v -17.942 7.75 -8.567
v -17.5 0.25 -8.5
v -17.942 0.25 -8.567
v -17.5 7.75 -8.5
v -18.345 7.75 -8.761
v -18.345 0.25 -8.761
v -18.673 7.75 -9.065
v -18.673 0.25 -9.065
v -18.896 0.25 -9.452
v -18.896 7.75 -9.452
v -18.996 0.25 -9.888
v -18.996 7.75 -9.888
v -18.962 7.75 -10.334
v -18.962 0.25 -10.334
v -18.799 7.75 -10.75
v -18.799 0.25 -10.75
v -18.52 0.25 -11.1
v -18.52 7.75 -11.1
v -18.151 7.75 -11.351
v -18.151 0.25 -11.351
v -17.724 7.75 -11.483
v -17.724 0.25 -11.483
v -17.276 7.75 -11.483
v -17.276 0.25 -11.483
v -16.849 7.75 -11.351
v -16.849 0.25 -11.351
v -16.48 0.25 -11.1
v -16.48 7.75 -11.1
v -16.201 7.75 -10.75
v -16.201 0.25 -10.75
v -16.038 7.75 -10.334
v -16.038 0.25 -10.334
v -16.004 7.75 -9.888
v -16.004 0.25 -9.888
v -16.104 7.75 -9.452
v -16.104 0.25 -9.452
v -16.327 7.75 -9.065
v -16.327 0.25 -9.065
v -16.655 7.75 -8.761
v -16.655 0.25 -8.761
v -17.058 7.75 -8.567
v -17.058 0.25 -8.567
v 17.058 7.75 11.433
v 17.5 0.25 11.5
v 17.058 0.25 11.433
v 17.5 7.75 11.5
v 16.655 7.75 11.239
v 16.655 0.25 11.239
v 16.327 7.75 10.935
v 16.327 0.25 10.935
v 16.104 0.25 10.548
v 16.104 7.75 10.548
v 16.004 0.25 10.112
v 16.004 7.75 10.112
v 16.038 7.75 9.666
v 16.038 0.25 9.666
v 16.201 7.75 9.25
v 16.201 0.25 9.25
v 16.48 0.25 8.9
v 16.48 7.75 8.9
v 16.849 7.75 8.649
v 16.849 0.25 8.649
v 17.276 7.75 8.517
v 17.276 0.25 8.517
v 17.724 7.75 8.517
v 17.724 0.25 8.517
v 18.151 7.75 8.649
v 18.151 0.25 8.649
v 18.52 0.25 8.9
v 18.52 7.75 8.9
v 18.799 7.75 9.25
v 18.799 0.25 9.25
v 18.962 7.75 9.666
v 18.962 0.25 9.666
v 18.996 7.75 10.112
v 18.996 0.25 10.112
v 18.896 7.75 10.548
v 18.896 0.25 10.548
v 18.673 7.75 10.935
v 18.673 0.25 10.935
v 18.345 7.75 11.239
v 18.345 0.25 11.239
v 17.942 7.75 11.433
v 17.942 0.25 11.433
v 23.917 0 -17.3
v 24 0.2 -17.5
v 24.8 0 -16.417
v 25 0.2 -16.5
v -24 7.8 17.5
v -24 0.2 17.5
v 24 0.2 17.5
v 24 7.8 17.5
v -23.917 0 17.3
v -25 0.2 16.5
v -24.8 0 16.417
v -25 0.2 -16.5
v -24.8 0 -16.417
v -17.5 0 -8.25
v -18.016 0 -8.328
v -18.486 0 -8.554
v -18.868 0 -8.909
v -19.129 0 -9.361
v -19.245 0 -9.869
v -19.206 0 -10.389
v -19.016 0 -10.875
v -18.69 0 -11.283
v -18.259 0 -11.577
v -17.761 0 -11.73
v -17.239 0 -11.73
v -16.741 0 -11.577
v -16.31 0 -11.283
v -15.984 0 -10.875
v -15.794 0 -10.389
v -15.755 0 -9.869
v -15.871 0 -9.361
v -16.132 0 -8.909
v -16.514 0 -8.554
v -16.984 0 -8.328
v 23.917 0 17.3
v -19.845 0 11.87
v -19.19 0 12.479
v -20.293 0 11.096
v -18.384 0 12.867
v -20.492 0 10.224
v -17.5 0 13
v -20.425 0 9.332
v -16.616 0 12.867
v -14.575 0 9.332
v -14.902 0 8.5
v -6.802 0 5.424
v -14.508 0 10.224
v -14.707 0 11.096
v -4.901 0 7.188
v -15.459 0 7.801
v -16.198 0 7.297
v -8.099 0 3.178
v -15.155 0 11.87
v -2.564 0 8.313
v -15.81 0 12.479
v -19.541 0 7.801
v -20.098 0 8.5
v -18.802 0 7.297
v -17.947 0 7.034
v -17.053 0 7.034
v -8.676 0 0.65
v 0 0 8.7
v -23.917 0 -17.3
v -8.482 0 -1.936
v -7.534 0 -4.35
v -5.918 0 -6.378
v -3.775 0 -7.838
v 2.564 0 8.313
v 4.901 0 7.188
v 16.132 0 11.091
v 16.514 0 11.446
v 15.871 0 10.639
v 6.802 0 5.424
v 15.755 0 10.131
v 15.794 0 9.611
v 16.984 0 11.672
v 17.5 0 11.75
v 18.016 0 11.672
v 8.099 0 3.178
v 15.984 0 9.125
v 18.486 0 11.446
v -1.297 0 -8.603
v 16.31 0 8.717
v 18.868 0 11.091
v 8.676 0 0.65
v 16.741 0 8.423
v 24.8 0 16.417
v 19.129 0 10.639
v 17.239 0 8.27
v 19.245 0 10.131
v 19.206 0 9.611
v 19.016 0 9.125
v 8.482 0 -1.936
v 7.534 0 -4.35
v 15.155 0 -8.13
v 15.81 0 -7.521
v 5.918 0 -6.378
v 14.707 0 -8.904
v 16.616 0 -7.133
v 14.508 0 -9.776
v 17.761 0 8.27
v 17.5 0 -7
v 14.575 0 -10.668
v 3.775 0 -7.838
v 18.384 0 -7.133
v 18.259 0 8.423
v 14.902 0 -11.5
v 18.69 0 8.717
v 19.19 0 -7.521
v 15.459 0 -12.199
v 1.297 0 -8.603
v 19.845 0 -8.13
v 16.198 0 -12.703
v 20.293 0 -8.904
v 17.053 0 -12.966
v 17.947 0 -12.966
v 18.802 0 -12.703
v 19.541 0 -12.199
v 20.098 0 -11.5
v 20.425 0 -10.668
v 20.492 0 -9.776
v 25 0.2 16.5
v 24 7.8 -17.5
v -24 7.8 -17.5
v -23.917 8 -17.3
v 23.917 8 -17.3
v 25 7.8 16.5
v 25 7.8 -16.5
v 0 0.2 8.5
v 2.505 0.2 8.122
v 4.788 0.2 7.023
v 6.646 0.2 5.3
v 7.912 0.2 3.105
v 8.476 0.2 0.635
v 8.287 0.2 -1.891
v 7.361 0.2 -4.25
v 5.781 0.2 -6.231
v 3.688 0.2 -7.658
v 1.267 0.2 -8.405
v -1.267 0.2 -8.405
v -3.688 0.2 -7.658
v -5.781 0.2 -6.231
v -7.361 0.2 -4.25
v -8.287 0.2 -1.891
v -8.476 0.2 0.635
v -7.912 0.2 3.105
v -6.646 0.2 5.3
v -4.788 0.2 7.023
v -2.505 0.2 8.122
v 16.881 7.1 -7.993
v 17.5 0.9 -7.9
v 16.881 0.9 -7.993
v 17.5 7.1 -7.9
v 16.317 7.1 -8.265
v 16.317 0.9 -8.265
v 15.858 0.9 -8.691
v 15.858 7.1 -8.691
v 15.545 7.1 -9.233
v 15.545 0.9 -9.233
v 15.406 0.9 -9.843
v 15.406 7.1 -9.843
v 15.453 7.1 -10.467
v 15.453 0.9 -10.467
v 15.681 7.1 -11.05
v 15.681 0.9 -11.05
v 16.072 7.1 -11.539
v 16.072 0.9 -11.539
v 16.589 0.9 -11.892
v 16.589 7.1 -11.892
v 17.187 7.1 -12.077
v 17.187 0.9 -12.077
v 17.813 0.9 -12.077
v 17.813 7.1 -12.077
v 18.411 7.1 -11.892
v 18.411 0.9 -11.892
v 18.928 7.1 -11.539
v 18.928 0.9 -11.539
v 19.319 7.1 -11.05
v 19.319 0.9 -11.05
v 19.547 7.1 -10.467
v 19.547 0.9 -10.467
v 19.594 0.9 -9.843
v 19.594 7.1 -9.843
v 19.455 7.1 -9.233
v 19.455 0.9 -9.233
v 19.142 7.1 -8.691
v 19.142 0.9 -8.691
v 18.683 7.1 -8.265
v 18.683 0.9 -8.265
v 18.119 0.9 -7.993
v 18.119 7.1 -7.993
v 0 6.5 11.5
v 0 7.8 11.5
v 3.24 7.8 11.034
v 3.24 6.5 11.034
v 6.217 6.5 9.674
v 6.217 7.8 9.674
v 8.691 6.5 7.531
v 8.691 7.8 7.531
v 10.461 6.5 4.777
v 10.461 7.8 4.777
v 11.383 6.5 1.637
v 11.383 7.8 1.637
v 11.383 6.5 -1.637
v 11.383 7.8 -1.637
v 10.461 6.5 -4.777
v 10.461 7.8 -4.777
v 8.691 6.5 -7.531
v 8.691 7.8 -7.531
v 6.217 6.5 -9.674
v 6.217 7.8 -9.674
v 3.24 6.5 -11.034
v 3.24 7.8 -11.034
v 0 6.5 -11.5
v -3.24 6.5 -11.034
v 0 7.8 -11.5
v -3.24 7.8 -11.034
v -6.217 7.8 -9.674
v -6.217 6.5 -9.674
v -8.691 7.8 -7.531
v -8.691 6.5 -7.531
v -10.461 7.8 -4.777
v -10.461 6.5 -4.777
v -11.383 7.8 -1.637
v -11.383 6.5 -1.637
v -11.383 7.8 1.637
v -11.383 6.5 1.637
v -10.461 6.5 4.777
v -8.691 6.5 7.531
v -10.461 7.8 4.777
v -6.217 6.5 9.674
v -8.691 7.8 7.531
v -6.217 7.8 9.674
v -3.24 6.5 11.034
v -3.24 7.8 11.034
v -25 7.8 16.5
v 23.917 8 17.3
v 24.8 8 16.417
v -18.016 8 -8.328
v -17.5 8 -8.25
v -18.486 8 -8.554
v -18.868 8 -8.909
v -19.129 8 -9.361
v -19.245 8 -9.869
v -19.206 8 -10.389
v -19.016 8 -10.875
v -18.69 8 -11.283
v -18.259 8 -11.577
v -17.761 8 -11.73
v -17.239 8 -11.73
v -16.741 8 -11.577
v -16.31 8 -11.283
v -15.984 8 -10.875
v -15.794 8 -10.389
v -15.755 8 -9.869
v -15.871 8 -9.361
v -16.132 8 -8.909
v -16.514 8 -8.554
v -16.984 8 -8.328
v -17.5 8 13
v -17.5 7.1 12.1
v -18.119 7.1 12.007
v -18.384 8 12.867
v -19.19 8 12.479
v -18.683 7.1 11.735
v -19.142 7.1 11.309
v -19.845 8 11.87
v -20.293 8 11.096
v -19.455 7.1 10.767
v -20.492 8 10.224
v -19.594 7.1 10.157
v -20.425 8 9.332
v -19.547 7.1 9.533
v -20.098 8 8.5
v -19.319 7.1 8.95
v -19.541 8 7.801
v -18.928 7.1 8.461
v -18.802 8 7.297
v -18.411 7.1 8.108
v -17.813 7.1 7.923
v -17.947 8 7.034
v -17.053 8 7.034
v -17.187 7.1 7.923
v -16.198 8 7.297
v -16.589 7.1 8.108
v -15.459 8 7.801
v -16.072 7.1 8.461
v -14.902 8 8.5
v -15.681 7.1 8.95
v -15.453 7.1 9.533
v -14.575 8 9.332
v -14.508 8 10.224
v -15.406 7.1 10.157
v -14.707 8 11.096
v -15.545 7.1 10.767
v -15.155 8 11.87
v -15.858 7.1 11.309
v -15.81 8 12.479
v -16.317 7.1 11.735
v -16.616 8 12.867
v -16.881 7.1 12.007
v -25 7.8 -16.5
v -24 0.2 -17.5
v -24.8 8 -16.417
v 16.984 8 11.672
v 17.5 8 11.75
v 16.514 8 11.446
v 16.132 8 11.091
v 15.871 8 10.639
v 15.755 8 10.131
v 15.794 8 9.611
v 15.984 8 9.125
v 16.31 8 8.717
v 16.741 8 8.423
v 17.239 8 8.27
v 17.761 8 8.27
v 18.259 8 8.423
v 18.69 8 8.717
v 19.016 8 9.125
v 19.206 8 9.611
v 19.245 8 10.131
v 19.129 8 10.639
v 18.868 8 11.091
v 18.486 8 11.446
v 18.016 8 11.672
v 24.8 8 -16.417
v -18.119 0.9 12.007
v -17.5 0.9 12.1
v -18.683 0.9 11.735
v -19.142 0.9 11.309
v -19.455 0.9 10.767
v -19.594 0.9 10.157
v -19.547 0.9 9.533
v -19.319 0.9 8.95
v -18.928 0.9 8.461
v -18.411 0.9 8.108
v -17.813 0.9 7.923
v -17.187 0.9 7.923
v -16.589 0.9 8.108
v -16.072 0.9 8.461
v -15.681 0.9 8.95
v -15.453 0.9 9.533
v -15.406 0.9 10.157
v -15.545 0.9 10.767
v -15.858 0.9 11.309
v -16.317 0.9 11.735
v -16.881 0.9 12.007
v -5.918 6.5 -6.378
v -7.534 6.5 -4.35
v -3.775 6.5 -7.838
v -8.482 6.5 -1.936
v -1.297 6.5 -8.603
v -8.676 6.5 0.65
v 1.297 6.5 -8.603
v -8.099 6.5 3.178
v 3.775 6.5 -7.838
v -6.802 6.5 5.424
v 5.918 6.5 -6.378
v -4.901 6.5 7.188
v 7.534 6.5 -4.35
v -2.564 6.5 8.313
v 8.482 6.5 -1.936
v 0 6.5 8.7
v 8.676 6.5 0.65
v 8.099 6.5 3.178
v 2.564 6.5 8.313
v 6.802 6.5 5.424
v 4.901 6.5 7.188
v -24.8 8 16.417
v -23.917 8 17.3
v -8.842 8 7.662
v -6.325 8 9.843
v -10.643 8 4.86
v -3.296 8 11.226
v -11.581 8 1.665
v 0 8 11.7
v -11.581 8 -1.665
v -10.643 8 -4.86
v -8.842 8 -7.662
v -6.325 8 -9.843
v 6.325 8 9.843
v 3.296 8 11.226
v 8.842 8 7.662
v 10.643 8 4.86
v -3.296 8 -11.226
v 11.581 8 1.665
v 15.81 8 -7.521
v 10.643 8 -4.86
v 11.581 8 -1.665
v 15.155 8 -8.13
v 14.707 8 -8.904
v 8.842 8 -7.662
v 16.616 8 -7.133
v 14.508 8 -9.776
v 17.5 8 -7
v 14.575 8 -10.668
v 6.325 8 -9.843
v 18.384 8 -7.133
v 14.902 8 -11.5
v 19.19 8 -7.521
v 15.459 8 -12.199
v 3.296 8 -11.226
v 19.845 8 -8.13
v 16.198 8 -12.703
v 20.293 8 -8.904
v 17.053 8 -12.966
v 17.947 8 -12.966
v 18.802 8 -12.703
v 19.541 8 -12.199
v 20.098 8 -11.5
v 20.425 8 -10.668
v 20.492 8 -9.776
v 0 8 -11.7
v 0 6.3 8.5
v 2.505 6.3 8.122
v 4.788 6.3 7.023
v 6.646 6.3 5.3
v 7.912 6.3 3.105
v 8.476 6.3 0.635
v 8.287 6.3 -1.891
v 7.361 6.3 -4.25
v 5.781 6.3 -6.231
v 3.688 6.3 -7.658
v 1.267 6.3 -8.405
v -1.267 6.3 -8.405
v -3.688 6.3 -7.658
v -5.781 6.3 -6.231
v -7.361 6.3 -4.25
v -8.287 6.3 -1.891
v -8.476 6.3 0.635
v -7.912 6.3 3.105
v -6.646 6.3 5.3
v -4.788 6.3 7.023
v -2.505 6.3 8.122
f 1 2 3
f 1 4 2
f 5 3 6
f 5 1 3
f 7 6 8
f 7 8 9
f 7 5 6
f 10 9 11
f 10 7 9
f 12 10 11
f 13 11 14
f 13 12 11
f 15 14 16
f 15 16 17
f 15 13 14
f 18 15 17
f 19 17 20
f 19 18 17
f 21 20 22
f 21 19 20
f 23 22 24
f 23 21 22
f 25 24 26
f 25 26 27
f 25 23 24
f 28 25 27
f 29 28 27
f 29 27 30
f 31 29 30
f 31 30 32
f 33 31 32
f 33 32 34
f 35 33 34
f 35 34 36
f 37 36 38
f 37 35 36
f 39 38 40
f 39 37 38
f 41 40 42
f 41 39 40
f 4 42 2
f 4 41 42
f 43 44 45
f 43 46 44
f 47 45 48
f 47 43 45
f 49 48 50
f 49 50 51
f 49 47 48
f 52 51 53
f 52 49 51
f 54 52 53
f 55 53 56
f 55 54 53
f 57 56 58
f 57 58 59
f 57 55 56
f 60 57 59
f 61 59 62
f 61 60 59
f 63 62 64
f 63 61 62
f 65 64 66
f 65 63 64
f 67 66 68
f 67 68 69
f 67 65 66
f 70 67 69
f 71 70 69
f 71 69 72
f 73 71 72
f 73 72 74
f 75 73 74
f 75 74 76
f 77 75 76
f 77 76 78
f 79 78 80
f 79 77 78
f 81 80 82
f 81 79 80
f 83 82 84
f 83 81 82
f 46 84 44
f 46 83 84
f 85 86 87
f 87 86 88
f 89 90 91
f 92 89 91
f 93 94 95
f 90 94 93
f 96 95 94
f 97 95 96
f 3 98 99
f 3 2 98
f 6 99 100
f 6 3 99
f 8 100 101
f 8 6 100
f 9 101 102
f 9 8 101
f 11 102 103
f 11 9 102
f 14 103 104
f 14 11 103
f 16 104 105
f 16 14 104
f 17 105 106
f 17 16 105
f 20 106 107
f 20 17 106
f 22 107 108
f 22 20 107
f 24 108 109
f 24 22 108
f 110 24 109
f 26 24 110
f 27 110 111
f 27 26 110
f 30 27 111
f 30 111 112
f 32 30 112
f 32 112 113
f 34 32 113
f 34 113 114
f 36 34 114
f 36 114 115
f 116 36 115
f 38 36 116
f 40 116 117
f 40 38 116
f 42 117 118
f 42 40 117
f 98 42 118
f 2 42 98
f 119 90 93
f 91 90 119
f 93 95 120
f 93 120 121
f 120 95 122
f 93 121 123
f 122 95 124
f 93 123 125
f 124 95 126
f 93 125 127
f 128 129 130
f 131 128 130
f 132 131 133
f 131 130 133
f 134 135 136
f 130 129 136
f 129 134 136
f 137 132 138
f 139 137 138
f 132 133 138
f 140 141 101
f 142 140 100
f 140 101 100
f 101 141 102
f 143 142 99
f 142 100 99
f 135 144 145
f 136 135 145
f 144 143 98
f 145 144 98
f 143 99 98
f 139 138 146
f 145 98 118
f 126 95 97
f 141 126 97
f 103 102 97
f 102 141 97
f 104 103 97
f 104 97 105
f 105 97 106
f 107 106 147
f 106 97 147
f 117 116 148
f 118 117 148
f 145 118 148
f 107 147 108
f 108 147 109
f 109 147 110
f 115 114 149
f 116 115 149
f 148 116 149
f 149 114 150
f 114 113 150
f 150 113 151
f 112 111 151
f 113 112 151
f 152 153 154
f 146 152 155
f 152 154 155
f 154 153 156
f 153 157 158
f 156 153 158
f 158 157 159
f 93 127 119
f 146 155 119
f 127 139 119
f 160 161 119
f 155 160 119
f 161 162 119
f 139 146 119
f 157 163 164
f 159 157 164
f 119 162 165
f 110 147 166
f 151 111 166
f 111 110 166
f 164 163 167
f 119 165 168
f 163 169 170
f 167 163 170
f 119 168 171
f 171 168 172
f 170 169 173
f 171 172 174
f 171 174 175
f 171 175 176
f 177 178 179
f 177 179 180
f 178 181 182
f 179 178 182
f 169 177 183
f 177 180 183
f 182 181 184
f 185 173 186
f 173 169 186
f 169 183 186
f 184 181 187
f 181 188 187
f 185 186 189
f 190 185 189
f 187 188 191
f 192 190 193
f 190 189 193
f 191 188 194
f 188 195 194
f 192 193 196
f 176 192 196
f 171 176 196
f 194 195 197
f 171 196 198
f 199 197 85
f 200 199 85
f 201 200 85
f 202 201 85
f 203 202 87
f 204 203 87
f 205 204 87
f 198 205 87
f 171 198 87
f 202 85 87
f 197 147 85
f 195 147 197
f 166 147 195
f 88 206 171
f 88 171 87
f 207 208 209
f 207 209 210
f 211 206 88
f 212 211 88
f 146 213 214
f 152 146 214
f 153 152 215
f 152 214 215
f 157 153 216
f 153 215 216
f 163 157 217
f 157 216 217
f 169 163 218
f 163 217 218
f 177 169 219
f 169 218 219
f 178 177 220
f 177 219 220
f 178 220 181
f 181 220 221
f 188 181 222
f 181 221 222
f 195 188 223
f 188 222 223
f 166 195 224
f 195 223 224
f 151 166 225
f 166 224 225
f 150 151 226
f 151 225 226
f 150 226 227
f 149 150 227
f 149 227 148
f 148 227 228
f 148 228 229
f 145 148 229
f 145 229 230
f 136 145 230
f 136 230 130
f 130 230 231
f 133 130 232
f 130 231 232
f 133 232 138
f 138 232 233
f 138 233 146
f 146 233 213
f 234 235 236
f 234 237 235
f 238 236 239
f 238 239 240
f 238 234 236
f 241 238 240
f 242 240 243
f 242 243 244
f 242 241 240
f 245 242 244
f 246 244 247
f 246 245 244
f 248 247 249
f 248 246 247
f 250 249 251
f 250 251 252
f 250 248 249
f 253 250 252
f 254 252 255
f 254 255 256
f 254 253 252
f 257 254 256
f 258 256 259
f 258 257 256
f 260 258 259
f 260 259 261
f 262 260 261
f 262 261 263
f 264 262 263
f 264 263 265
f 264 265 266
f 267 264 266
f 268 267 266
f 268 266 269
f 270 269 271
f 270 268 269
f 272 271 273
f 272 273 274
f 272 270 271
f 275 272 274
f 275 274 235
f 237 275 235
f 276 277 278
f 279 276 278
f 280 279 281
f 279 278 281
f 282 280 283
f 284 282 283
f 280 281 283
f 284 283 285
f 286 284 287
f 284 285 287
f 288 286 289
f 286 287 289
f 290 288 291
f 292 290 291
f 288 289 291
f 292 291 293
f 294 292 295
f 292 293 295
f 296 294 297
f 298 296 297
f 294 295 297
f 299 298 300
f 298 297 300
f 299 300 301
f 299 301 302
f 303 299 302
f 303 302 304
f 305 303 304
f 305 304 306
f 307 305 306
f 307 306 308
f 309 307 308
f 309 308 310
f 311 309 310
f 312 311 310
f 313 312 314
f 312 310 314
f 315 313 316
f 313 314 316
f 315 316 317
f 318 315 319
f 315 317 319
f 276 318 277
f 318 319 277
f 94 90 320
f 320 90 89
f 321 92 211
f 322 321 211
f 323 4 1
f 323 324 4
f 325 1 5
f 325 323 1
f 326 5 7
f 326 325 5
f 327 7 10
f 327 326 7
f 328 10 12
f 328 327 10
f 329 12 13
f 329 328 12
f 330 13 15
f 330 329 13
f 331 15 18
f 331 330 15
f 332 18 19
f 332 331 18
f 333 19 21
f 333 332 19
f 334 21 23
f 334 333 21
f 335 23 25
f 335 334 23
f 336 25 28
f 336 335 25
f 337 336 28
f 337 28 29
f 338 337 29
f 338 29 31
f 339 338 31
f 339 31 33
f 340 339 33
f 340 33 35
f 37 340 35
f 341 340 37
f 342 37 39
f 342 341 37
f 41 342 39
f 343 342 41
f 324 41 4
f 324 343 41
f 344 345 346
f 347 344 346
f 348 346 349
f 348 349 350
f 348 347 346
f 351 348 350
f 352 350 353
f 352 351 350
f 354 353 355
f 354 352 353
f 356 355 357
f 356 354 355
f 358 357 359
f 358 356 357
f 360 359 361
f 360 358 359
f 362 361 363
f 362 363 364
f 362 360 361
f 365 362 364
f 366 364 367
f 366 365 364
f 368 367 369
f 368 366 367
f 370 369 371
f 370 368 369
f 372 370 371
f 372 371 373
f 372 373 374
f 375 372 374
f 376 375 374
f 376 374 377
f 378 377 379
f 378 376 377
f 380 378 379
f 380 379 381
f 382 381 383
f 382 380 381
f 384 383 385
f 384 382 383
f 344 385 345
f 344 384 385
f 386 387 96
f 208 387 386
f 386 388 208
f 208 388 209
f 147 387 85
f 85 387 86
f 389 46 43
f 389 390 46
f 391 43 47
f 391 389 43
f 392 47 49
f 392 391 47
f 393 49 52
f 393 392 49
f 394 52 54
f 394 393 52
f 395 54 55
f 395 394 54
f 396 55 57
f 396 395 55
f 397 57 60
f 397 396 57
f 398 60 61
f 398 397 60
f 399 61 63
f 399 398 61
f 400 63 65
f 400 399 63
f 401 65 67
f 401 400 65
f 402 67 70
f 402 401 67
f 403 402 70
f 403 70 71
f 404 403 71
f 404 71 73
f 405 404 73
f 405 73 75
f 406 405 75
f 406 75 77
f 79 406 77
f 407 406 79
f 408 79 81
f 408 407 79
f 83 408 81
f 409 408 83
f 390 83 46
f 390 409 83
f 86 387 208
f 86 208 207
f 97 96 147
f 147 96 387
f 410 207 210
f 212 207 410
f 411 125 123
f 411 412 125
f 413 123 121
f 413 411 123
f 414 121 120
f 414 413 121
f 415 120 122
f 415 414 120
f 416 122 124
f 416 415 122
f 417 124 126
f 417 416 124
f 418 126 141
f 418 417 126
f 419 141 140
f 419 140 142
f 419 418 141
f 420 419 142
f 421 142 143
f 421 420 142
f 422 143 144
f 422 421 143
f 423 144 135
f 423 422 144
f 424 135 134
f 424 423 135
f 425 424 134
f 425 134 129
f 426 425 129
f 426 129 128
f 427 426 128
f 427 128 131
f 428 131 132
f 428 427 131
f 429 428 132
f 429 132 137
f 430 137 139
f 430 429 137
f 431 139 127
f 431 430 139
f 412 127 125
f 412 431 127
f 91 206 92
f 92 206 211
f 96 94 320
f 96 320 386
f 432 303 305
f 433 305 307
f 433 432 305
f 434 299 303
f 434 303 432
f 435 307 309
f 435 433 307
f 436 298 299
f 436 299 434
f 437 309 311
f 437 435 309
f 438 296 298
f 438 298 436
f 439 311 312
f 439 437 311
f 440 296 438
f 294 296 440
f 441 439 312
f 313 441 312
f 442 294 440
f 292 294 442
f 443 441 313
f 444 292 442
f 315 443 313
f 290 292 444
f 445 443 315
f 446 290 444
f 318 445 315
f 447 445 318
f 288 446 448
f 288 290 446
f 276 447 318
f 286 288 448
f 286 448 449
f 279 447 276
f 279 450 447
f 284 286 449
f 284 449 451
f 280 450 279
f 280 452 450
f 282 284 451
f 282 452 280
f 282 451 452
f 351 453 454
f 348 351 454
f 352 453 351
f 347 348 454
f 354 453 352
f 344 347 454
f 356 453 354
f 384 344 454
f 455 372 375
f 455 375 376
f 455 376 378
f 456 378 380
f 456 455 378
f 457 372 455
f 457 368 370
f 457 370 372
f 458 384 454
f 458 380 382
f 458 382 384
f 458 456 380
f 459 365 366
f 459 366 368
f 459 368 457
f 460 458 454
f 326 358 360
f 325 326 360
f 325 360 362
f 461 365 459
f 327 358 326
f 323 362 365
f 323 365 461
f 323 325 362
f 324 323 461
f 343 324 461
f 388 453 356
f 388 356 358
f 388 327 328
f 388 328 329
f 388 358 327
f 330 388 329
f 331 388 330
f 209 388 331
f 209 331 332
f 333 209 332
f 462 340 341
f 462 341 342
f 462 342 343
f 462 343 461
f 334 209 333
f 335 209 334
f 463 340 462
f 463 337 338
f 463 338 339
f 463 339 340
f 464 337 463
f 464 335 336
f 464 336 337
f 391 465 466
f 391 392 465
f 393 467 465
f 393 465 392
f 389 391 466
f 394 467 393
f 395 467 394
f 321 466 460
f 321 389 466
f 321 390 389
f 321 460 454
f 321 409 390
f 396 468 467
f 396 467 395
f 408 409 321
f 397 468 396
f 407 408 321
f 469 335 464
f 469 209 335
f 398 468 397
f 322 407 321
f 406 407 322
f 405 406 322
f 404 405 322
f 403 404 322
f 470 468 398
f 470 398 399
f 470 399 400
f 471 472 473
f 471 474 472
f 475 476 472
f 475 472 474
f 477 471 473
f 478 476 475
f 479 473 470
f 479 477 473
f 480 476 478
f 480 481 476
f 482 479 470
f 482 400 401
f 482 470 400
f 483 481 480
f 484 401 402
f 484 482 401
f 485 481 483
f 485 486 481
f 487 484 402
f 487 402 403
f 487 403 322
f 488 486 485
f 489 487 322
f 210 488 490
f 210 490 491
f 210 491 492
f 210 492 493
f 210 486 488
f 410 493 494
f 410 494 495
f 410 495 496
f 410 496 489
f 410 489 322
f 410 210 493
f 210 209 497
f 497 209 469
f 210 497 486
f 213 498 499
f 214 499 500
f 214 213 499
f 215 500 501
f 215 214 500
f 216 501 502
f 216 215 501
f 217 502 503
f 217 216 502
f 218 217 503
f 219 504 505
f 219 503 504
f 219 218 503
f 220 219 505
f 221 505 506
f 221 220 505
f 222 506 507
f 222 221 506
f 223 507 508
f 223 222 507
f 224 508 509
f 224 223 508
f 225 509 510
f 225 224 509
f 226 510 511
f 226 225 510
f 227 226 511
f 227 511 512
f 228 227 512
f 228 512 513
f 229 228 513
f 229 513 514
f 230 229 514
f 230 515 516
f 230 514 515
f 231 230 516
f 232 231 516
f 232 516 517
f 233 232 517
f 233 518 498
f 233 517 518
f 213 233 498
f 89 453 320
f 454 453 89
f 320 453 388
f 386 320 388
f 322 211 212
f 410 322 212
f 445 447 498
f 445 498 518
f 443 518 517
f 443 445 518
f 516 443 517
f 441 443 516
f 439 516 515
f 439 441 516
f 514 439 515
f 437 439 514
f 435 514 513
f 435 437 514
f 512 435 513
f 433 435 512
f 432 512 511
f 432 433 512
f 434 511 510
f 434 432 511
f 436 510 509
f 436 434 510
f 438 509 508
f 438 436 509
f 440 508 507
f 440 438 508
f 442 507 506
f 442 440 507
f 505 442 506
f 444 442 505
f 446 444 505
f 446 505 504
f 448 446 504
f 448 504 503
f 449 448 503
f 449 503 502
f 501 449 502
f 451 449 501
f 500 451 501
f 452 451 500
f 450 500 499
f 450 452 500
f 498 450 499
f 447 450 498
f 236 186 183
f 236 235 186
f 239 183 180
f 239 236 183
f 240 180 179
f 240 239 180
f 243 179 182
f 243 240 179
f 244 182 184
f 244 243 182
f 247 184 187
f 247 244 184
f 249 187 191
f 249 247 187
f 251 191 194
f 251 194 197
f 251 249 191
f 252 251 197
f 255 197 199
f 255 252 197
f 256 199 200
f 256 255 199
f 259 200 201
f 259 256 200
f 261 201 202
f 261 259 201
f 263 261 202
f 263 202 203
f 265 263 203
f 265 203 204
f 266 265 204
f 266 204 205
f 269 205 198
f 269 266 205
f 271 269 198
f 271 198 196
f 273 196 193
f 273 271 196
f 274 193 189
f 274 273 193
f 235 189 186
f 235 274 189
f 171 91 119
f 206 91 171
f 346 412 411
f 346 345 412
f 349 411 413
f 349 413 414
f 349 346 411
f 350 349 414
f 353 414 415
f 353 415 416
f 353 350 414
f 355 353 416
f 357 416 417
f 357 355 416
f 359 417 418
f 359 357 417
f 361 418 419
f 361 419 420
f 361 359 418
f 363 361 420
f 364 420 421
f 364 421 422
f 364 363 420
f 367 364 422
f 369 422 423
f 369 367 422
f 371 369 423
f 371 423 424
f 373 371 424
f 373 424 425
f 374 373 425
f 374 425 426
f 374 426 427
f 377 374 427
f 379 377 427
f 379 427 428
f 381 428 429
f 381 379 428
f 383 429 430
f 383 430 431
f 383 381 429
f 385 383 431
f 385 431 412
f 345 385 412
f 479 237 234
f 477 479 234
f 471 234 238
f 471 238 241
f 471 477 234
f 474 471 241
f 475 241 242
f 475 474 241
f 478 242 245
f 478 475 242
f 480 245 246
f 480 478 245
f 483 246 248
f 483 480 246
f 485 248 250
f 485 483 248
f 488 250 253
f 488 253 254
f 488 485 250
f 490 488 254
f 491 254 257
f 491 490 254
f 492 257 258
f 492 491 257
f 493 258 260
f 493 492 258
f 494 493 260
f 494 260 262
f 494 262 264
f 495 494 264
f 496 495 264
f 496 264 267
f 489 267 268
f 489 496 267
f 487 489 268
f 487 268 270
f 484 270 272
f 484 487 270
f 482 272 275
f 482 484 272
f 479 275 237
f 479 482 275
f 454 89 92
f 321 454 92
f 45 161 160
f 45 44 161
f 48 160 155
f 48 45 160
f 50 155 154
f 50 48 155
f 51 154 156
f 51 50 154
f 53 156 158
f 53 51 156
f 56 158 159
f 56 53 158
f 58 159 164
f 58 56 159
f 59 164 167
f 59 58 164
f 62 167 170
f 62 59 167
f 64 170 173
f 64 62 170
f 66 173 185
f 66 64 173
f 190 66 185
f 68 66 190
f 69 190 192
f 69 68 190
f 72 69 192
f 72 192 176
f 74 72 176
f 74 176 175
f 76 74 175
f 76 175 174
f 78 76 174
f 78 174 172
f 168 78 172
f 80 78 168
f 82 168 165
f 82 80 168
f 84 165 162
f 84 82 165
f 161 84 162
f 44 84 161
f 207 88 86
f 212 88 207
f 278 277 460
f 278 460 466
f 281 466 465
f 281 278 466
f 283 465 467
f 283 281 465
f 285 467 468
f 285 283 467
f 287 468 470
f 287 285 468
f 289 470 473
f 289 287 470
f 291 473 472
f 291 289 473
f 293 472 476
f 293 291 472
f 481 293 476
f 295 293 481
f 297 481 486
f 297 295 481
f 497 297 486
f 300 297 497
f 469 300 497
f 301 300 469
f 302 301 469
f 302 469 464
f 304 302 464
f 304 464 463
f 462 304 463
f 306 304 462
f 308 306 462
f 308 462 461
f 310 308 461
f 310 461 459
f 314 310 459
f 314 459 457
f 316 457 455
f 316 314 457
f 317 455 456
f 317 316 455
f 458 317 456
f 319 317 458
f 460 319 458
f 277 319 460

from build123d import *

# Parameters (mm, degrees)
SKETCH1_W                      = 50
SKETCH1_H                      = 35
SKETCH1_R                      = 8.5
BOSS_EXTRUDE1_DEPTH            = 8
F_3_0MM_DOWEL_HOLE1_AT_2_COUNT = 2
F_3_0MM_DOWEL_HOLE1_AT_2_PITCH = 40.311288741
M5X0_8_TAPPED_HOLE1_AT_2_COUNT = 2
M5X0_8_TAPPED_HOLE1_AT_2_PITCH = 40.311288741
SKETCH6_R                      = 11.5
CUT_EXTRUDE1_DEPTH             = 1.5
CHAMFER1_SIZE                  = 1
CHAMFER2_SIZE                  = 0.2


with BuildPart() as part:
    # Sketch1 → Boss-Extrude1 (new body)
    with BuildSketch(Plane(origin=(0, 0, 0), x_dir=(1, 0, 0), z_dir=(0, 1, 0))):
        Rectangle(SKETCH1_W, SKETCH1_H)
        with Locations(Location((0, 0, 0), (0, 0, 270))):
            Circle(SKETCH1_R, mode=Mode.SUBTRACT)
    extrude(amount=BOSS_EXTRUDE1_DEPTH)

    # Sketch3 → Ø3.0mm Dowel Hole1 (revolve, cut)
    with BuildSketch(Plane(origin=(-17.5, 8, -10), x_dir=(0, 0, 1), z_dir=(1, 0, 0))):
        Polygon((0, 0), (0, 8), (1.75, 8), (1.5, 7.75), (1.5, 0.25), (1.75, 0), align=None)
    f_3_0mm_dowel_hole1 = revolve(axis=Axis((-17.5, 14.35, -10), (0, -1, 0)), mode=Mode.SUBTRACT)

    # Ø3.0mm Dowel Hole1 at 2: Ø3.0mm Dowel Hole1 ×2
    with Locations(*[Vector(0.8682431421244593, 0, 0.49613893835683387) * (i * F_3_0MM_DOWEL_HOLE1_AT_2_PITCH) for i in range(1, F_3_0MM_DOWEL_HOLE1_AT_2_COUNT)]):
        add(f_3_0mm_dowel_hole1, mode=Mode.SUBTRACT)

    # Sketch5 → M5x0.8 Tapped Hole1 (revolve, cut)
    with BuildSketch(Plane(origin=(17.5, 8, -10), x_dir=(0, 0, 1), z_dir=(1, 0, 0))):
        Polygon((0, 0), (0, 8), (3, 8), (2.1, 7.1), (2.1, 0.9), (3, 0), align=None)
    m5x0_8_tapped_hole1 = revolve(axis=Axis((17.5, 14.35, -10), (0, -1, 0)), mode=Mode.SUBTRACT)

    # M5x0.8 Tapped Hole1 at 2: M5x0.8 Tapped Hole1 ×2
    with Locations(*[Vector(-0.8682431421244593, 0, 0.49613893835683387) * (i * M5X0_8_TAPPED_HOLE1_AT_2_PITCH) for i in range(1, M5X0_8_TAPPED_HOLE1_AT_2_COUNT)]):
        add(m5x0_8_tapped_hole1, mode=Mode.SUBTRACT)

    # Sketch6 → Cut-Extrude1 (cut)
    with BuildSketch(Plane(origin=(0, 8, 0), x_dir=(1, 0, 0), z_dir=(0, 1, 0))):
        with Locations(Location((0, 0, 0), (0, 0, 270))):
            Circle(SKETCH6_R)
    extrude(amount=-CUT_EXTRUDE1_DEPTH, mode=Mode.SUBTRACT)

    # Chamfer1
    chamfer1_edges = [part.edges().sort_by_distance(p)[0] for p in [
        (-25, 4, -17.5),
        (25, 4, -17.5),
        (25, 4, 17.5),
        (-25, 4, 17.5),
    ]]
    chamfer(chamfer1_edges, length=CHAMFER1_SIZE)

    # Chamfer2
    chamfer2_edges = [part.edges().sort_by_distance(p)[0] for p in [
        (0, 0, -8.5),
        (0, 6.5, -8.5),
        (0, 8, -11.5),
        (0, 0, -17.5),
        (0, 8, -17.5),
        (-25, 0, 0),
        (25, 0, 0),
        (0, 0, 17.5),
        (-24.5, 0, 17),
        (-24.5, 0, -17),
        (24.5, 0, 17),
        (24.5, 0, -17),
        (25, 8, 0),
        (-25, 8, 0),
        (0, 8, 17.5),
        (-24.5, 8, 17),
        (-24.5, 8, -17),
        (24.5, 8, 17),
        (24.5, 8, -17),
    ]]
    chamfer(chamfer2_edges, length=CHAMFER2_SIZE)


solid = part.part
